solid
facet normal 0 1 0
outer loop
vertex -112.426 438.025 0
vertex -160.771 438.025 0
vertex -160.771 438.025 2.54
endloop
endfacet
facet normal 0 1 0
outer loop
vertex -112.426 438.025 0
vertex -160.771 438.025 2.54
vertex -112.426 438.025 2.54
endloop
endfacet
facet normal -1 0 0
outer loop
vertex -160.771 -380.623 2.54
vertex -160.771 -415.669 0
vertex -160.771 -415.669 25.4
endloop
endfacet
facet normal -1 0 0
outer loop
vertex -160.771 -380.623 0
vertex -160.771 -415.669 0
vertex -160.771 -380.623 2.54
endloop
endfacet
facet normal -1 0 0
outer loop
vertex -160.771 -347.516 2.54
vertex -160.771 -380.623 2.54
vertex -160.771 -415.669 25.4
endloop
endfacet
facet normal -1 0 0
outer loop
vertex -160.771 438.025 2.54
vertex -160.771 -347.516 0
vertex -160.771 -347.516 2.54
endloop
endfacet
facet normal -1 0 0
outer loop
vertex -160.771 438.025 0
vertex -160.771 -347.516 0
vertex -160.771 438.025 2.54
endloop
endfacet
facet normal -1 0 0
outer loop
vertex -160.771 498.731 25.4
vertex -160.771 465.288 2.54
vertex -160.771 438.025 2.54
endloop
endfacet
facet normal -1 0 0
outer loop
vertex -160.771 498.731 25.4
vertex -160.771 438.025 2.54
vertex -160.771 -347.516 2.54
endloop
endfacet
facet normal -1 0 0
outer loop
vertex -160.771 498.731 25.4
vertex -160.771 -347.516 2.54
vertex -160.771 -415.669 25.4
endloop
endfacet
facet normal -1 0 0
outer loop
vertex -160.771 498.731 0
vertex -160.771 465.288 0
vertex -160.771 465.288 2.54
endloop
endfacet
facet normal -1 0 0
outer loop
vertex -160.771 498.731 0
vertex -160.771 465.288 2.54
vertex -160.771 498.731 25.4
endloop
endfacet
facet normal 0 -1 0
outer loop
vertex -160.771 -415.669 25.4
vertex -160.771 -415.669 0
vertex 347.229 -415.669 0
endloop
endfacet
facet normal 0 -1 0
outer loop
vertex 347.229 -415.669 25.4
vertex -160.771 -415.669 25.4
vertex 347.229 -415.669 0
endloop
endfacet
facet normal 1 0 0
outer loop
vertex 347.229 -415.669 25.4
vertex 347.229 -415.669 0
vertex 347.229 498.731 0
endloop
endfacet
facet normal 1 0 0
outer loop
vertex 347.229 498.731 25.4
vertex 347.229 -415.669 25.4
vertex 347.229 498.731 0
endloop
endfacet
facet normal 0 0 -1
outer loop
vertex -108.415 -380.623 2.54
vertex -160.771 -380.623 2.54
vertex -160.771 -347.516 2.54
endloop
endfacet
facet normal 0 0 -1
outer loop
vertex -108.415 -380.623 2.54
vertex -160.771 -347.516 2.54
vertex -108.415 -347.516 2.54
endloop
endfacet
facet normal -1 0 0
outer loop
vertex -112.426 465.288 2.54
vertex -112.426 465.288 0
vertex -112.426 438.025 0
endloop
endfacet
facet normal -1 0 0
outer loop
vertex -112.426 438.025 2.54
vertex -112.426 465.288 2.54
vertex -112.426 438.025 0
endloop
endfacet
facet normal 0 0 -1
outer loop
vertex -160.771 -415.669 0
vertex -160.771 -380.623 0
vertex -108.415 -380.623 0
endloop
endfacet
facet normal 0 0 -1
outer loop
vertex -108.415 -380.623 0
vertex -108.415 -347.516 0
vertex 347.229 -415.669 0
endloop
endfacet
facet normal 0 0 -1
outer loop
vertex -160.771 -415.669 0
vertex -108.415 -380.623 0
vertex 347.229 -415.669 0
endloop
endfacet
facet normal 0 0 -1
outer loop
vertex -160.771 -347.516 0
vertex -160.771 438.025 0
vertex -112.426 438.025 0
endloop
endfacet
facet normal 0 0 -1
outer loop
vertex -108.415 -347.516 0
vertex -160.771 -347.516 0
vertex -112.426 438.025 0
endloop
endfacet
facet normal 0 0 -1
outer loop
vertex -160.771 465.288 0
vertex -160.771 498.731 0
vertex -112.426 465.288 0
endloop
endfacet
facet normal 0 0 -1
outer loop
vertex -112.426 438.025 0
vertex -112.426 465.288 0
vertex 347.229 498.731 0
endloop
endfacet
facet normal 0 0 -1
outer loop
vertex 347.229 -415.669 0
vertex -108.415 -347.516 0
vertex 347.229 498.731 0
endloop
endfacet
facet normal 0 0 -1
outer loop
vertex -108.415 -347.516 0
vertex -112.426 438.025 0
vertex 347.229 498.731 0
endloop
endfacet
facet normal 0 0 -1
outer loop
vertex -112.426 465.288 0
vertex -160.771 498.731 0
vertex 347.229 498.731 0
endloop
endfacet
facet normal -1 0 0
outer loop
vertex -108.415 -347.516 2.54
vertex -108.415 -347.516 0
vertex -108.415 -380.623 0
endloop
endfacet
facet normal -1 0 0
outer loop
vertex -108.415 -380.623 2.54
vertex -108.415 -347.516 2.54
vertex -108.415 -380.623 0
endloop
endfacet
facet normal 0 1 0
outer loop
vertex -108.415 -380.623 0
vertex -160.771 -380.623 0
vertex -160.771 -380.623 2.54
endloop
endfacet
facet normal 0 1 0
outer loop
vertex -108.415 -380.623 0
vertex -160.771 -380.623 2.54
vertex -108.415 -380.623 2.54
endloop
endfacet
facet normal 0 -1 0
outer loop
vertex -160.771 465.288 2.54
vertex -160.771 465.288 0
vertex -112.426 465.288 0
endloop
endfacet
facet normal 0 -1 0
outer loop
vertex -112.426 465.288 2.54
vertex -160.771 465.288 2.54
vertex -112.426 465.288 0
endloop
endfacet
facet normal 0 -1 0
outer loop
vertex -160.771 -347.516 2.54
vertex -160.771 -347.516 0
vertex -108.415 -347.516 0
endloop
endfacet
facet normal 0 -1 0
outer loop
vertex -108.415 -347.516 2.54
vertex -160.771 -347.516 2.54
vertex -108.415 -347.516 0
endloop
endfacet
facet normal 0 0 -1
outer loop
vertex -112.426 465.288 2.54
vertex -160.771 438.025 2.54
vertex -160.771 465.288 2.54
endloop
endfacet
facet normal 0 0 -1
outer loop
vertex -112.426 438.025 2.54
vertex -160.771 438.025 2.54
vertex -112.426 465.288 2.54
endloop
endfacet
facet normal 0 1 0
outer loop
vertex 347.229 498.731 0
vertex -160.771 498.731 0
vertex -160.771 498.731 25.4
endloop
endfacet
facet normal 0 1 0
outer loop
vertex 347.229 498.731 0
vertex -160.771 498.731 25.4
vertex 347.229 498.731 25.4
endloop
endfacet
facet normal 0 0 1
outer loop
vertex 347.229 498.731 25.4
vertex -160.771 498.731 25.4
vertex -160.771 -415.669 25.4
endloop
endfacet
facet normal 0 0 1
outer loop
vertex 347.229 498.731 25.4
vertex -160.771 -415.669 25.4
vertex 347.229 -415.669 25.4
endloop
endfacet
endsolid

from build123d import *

# Parameters (mm, degrees)
F0_W     = 508
F0_H     = 914.4
F1_DEPTH = 25.4
F2_W     = 52.3558772112
F2_H     = 33.1072211266
F3_DEPTH = 2.54
F4_W     = 48.3446559812
F4_H     = 27.2626578808
F5_DEPTH = 2.54


with BuildPart() as f1:
    # F0 (on Top) → F1 (new body)
    with BuildSketch(Plane.XY):
        with Locations((93.2292269563, 41.5309555829)):
            Rectangle(F0_W, F0_H)
    extrude(amount=F1_DEPTH)

    # F2 (on face) → F3 (cut)
    with BuildSketch(Plane(origin=(0, 0, 0), x_dir=(1, 0, 0), z_dir=(0, 0, -1))):
        with Locations((-134.5928344381, 364.0698194504)):
            Rectangle(F2_W, F2_H)
    extrude(amount=-F3_DEPTH, mode=Mode.SUBTRACT)

    # F4 (on face) → F5 (cut)
    with BuildSketch(Plane(origin=(0, 0, 0), x_dir=(1, 0, 0), z_dir=(0, 0, -1))):
        with Locations((-136.5984450532, -451.6562968493)):
            Rectangle(F4_W, F4_H)
    extrude(amount=-F5_DEPTH, mode=Mode.SUBTRACT)


solid = f1.part
